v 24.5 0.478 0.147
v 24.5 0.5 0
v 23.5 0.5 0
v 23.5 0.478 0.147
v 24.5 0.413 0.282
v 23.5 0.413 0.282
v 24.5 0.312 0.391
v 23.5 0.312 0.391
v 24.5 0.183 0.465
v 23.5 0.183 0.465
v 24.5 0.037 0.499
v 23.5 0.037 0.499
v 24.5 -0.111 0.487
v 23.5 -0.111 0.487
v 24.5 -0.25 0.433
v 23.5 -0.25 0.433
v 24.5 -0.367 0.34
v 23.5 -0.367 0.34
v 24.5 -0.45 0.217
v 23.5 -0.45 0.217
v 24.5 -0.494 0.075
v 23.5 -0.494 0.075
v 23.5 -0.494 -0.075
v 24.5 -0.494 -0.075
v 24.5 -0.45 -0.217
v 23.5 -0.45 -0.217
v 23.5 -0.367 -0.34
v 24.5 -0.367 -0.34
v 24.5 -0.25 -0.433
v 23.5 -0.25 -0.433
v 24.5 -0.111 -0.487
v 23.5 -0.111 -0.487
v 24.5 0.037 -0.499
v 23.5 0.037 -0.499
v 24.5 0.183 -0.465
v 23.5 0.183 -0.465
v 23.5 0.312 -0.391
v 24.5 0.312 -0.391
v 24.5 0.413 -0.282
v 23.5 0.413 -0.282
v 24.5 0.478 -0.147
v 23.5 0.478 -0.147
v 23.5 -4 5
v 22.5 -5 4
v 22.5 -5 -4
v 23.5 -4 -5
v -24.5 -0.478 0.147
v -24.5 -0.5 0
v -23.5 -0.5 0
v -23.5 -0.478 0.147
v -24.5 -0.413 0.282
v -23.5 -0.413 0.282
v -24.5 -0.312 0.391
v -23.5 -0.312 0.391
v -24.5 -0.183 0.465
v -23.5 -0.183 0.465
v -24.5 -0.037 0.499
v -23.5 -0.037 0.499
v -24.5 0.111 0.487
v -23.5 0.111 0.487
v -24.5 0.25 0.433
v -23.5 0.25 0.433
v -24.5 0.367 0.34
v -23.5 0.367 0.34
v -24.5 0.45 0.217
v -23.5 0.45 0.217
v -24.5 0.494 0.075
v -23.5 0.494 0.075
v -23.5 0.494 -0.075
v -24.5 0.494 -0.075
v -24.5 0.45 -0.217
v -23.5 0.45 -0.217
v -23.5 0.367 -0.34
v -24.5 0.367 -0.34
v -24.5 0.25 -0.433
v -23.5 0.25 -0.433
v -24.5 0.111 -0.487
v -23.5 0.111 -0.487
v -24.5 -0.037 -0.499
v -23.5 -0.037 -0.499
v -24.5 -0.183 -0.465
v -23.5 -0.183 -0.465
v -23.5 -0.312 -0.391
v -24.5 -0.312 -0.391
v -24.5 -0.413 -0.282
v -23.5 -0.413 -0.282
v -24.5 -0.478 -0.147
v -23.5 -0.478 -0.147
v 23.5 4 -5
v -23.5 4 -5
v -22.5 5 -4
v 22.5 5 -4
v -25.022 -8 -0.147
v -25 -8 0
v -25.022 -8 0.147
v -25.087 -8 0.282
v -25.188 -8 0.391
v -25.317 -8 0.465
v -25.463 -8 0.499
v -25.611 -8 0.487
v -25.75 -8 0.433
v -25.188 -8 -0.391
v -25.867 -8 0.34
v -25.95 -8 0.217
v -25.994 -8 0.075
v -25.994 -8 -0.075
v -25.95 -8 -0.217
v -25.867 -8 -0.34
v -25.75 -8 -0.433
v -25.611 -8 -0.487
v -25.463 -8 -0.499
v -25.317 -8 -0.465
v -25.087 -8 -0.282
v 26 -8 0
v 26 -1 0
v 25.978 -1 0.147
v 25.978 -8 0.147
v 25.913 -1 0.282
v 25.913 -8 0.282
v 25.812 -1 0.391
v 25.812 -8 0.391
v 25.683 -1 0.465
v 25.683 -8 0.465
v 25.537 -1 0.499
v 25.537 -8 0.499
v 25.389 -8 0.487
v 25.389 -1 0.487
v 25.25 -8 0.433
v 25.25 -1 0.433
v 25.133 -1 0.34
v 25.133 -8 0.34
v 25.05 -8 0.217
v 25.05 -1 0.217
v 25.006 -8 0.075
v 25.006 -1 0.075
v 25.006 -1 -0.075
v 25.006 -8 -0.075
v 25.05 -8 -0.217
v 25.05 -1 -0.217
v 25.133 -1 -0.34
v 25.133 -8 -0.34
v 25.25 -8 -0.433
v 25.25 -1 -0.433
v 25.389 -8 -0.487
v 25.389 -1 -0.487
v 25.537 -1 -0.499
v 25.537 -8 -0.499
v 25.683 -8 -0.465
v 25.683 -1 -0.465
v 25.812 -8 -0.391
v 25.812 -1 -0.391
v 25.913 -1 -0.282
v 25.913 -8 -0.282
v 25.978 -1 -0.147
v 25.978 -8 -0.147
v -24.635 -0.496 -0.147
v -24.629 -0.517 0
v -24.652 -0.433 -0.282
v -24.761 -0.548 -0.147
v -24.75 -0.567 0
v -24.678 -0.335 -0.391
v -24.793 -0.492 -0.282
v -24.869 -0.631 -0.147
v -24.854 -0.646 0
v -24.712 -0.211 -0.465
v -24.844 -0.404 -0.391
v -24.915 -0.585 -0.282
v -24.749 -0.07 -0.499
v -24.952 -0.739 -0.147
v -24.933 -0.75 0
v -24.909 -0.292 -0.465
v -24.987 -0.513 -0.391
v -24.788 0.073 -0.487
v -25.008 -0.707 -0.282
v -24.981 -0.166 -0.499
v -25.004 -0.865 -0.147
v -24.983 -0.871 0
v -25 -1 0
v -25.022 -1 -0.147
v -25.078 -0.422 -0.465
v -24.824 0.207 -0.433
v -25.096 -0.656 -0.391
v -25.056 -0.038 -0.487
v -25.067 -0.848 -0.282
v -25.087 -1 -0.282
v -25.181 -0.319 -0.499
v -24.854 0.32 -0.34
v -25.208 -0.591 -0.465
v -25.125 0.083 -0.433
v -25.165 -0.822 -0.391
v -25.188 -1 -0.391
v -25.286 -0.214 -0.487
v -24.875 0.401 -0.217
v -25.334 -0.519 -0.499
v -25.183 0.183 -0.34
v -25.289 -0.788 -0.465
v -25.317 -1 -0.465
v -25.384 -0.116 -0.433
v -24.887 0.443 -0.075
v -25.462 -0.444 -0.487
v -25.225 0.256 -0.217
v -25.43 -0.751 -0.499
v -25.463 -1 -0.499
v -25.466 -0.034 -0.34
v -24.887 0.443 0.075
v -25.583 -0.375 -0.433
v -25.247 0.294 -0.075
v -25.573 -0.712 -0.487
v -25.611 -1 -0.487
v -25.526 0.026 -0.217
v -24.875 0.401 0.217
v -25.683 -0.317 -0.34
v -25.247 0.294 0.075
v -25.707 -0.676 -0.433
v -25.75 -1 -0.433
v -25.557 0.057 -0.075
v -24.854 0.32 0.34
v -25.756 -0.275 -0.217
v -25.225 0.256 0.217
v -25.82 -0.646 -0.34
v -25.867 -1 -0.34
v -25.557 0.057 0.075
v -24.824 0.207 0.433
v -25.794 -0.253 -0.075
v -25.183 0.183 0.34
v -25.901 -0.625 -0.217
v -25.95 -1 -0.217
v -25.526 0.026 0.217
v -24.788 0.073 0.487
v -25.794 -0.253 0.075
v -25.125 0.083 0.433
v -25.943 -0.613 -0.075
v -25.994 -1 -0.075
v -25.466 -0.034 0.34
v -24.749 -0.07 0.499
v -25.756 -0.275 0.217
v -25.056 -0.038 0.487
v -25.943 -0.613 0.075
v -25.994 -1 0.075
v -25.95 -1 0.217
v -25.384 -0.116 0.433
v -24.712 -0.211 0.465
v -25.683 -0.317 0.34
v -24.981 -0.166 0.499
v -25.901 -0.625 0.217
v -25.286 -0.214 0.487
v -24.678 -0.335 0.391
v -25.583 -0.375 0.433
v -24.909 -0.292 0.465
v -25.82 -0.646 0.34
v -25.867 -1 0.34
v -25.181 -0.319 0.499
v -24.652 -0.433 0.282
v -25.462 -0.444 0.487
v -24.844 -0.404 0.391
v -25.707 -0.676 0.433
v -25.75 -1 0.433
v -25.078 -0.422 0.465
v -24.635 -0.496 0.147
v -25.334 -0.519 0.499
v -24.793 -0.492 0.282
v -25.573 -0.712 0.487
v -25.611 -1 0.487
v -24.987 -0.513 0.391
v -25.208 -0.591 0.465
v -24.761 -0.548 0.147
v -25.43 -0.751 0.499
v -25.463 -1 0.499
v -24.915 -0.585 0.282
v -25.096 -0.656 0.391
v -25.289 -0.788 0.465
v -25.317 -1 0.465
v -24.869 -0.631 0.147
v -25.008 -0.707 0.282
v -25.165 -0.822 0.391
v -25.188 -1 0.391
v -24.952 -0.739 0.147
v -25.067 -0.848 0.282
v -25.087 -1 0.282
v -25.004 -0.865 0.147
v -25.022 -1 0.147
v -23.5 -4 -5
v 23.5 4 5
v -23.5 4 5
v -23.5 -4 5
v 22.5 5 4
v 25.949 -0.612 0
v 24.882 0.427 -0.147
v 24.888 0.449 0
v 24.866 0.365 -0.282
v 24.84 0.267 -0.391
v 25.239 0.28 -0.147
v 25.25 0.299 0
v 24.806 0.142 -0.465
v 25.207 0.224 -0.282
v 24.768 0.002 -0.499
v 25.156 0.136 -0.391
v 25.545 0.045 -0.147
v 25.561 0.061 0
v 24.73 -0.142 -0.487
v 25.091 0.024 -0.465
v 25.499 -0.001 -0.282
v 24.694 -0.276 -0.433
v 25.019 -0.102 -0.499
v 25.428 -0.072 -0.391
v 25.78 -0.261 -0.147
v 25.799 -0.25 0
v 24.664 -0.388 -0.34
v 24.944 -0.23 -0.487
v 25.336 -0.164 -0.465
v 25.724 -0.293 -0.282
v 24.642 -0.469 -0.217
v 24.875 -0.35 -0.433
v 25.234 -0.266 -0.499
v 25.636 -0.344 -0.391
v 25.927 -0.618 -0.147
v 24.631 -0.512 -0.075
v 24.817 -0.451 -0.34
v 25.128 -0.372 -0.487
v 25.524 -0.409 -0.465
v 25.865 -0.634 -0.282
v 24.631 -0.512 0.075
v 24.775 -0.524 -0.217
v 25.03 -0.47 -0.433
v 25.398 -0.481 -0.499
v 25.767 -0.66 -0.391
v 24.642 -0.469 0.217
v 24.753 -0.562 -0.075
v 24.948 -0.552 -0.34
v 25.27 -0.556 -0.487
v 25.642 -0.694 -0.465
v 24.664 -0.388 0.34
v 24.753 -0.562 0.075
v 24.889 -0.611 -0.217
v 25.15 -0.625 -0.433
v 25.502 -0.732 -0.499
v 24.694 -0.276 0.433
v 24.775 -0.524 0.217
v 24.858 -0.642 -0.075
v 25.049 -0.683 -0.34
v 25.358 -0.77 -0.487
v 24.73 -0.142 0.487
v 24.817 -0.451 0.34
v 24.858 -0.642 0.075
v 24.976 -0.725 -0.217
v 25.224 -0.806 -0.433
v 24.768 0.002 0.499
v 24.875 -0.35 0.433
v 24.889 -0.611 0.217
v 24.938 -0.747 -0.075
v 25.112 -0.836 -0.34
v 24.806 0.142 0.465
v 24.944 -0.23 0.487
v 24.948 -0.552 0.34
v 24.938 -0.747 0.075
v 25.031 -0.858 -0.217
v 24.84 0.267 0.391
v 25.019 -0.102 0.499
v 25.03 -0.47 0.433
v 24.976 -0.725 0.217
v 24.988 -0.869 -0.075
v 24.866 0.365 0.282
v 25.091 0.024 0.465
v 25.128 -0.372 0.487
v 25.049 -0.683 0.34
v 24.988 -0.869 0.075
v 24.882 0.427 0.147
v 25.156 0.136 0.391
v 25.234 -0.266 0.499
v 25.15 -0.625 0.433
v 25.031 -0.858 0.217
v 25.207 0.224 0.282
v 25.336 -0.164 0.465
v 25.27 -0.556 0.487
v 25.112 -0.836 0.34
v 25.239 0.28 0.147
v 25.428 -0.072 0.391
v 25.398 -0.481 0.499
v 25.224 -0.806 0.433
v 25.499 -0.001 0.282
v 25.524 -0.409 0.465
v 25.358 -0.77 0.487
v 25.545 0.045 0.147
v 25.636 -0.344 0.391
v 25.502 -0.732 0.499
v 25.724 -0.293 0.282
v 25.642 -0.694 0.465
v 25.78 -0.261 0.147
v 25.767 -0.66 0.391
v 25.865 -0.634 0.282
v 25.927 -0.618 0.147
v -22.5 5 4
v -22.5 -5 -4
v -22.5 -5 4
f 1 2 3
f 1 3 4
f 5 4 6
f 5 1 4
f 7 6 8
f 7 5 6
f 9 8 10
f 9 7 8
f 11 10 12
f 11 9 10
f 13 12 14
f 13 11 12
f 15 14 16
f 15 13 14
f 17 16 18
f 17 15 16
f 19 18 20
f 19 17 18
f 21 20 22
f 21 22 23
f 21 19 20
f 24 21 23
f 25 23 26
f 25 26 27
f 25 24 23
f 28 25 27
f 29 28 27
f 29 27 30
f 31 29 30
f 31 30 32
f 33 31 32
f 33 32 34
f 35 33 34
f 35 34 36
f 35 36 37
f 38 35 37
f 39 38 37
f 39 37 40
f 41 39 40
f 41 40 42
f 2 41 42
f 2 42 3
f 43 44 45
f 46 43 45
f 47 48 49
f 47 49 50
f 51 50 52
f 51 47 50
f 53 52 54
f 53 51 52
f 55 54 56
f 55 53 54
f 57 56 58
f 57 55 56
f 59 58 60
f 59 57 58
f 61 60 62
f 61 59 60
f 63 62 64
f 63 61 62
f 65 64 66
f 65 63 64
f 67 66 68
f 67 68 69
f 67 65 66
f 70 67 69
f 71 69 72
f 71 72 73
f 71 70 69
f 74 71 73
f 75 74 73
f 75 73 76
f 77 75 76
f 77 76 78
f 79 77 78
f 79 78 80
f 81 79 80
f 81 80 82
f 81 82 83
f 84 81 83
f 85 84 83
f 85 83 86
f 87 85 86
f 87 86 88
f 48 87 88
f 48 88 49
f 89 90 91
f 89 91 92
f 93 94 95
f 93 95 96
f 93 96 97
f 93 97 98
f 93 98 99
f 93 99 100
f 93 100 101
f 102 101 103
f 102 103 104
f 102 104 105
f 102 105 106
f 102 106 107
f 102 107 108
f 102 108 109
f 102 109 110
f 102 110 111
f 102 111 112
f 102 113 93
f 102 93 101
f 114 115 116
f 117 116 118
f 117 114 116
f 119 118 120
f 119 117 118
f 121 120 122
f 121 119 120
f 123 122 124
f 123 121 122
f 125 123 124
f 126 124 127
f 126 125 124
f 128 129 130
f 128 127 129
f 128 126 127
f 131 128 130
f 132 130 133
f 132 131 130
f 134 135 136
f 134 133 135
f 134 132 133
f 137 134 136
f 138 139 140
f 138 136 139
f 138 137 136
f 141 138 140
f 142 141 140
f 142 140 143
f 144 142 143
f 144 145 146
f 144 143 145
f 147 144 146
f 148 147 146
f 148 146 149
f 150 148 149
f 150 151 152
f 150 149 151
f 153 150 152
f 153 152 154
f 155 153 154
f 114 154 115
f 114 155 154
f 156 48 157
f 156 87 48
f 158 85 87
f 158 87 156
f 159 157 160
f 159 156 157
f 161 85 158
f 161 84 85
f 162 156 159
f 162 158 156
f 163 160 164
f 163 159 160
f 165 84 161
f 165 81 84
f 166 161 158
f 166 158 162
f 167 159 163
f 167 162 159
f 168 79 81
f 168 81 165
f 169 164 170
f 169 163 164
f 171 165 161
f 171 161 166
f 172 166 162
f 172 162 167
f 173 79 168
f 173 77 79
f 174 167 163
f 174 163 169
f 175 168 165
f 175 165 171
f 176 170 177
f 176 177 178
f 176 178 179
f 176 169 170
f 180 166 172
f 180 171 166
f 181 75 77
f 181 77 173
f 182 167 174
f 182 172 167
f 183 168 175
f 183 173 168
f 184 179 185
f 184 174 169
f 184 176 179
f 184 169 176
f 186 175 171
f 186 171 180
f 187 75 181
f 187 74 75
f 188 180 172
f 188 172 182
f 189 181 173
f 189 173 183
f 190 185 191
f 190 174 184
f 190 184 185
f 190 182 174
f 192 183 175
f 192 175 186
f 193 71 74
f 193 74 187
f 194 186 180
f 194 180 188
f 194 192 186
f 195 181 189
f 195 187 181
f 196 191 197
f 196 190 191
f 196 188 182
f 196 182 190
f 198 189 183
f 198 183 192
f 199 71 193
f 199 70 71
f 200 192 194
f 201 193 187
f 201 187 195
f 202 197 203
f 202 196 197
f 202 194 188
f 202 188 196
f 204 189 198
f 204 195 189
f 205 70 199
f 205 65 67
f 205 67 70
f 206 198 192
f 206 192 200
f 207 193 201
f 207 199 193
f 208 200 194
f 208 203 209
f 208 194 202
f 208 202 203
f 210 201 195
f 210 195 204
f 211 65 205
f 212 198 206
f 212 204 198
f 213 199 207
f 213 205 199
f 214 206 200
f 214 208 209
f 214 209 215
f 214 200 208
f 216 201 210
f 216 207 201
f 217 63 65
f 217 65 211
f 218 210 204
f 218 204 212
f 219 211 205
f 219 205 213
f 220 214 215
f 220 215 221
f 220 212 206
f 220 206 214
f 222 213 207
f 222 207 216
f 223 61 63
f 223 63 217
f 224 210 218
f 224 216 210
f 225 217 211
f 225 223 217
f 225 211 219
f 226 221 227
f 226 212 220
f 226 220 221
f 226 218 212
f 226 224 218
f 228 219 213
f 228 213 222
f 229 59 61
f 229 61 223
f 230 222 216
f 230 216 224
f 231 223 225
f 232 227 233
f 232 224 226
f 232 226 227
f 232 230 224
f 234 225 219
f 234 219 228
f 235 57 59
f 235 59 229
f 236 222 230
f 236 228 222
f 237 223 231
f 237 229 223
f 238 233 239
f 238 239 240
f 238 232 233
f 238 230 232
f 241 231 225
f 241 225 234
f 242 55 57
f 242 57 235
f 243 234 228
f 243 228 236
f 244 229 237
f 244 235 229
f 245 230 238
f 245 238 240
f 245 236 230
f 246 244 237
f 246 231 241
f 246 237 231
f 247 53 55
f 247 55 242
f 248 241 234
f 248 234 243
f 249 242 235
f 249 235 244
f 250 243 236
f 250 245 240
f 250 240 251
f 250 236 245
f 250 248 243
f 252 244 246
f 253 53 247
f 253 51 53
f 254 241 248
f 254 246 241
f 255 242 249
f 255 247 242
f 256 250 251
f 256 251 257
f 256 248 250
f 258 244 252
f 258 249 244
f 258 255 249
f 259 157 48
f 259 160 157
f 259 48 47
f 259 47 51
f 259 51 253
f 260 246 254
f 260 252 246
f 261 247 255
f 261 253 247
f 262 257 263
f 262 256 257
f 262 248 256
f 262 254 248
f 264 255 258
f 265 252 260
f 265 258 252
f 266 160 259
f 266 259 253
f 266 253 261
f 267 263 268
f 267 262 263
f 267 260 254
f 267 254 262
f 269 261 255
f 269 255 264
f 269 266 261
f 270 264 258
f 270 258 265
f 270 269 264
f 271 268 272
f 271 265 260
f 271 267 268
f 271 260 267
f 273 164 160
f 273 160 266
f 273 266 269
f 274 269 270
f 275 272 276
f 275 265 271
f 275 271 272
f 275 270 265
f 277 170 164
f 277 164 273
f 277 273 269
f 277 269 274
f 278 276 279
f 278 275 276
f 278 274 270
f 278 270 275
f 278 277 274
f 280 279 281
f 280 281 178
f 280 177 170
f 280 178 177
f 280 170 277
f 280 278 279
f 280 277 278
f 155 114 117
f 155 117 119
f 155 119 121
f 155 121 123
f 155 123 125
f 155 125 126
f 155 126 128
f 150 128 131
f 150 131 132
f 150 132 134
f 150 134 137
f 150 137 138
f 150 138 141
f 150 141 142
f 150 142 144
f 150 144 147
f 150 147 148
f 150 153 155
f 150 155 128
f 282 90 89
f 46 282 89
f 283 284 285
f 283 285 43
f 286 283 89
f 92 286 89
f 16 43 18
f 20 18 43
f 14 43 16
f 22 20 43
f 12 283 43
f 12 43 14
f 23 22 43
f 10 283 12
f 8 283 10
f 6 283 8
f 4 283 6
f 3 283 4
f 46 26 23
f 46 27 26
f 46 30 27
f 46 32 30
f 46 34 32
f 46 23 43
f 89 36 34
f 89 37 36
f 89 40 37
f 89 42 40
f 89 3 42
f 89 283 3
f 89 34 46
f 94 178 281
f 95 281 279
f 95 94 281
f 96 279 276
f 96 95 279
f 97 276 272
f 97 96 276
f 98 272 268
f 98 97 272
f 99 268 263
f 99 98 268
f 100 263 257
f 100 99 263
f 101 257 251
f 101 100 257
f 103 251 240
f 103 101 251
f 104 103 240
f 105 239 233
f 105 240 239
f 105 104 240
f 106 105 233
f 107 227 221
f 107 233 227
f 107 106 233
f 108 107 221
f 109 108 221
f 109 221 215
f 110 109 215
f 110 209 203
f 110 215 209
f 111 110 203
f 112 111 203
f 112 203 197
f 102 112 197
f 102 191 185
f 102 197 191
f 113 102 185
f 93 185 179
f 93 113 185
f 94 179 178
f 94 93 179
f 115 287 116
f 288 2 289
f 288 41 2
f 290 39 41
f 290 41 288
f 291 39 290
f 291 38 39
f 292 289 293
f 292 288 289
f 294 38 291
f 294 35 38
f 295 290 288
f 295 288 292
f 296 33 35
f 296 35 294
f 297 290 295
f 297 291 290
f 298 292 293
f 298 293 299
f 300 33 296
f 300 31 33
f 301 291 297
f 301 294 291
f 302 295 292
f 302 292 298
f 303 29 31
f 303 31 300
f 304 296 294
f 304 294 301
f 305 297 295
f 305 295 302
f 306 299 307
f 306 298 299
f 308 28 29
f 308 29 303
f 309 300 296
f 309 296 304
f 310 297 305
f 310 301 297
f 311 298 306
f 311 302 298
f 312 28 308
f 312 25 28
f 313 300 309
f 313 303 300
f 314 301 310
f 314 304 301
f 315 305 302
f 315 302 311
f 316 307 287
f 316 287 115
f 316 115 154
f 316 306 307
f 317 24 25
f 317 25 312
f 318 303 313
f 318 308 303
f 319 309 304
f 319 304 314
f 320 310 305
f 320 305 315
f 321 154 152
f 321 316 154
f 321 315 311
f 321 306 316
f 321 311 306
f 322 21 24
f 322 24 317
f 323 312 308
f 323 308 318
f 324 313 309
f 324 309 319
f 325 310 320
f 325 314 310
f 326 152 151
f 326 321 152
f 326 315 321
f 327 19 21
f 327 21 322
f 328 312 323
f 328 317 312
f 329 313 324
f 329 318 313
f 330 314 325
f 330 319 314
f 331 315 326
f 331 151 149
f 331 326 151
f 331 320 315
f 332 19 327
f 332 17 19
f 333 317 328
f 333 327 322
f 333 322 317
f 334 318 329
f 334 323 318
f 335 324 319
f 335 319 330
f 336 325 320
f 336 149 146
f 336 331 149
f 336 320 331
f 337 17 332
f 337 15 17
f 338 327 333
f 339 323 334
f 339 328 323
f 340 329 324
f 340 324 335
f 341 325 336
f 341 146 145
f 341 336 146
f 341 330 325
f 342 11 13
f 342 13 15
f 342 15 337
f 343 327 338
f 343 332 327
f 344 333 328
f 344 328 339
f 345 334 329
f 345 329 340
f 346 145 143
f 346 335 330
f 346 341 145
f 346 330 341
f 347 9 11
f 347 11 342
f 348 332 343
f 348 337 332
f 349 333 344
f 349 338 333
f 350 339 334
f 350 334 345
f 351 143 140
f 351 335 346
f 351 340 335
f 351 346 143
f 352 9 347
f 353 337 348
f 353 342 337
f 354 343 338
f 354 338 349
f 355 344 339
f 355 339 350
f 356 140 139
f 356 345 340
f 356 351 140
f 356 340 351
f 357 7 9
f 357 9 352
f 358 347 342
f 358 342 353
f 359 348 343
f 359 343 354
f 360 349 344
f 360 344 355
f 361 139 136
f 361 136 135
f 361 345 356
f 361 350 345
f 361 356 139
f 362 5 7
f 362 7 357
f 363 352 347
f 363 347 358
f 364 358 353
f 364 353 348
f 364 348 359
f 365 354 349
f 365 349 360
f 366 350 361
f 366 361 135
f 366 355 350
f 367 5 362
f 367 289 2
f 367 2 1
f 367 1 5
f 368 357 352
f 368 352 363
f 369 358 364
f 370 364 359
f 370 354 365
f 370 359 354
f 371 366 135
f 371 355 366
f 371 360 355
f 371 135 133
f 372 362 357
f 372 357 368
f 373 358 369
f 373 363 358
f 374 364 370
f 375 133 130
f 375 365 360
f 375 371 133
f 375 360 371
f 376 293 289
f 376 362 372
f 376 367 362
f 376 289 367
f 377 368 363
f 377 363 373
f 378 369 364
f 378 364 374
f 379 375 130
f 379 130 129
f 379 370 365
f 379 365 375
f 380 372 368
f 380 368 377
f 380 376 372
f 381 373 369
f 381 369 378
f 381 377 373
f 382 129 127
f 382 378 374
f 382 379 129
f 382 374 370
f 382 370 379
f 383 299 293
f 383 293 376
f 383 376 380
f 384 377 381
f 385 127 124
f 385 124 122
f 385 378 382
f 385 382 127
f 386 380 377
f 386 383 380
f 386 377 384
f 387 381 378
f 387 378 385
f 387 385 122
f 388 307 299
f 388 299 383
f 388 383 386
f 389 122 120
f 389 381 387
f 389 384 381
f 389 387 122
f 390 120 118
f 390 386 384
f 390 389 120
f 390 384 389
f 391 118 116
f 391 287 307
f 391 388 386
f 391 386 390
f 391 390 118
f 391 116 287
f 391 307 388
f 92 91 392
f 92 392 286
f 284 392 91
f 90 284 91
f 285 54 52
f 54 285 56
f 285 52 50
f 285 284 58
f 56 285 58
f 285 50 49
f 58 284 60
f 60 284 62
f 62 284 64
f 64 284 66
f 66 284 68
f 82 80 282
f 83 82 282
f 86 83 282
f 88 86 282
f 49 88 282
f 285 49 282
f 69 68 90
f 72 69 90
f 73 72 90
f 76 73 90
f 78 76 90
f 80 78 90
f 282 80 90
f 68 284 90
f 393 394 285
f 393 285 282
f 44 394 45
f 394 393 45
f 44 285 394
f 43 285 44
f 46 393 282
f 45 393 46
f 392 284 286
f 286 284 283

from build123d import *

# Parameters (mm, degrees)
SKETCH_1_W        = 47
SKETCH_1_H        = 10
EXTRUDE_1_DEPTH   = 5
CHAMFER_1_SIZE    = 1
SWEEP_1_PROFILE_R = 0.5
SWEEP_2_PROFILE_R = 0.5


with BuildPart() as part:
    # 草图1 → 凸台-拉伸1 (new, symmetric)
    with BuildSketch(Plane(origin=(0, 0, 0), x_dir=(1, 0, 0), z_dir=(0, 1, 0))):
        Rectangle(SKETCH_1_W, SKETCH_1_H)
    extrude(amount=EXTRUDE_1_DEPTH, both=True)

    # 倒角1
    chamfer_1_edges = [part.edges().sort_by_distance(p)[0] for p in [
        (-23.5, 5, 0),
        (0, 5, 5),
        (23.5, 5, 0),
        (0, -5, 5),
        (-23.5, -5, 0),
        (0, -5, -5),
        (23.5, -5, 0),
        (0, 5, -5),
    ]]
    chamfer(chamfer_1_edges, length=CHAMFER_1_SIZE)

    # 扫描1: sweep along a path in 草图2
    with BuildLine(Plane.XY) as sweep_1_path:
        Line((23.5, 0), (24.5, 0))
        ThreePointArc((24.5, 0), (25.207106781, -0.292893219), (25.5, -1))
        Line((25.5, -1), (25.5, -8))
    # 扫描1 profile (on start of the path) → 扫描1 (sweep)
    with BuildSketch(Plane.YZ.offset(23.5)):
        Circle(SWEEP_1_PROFILE_R)
    sweep(path=sweep_1_path.line)

    # 扫描2: sweep along a path in 草图9
    with BuildLine(Plane.XY) as sweep_2_path:
        Line((-23.5, 0), (-24.5, 0))
        ThreePointArc((-24.5, 0), (-25.207106781, -0.292893219), (-25.5, -1))
        Line((-25.5, -1), (-25.5, -8))
    # 扫描2 profile (on start of the path) → 扫描2 (sweep)
    with BuildSketch(Plane(origin=(-23.5, 0, 0), x_dir=(0, -1, 0), z_dir=(-1, 0, 0))):
        Circle(SWEEP_2_PROFILE_R)
    sweep(path=sweep_2_path.line)


solid = part.part
